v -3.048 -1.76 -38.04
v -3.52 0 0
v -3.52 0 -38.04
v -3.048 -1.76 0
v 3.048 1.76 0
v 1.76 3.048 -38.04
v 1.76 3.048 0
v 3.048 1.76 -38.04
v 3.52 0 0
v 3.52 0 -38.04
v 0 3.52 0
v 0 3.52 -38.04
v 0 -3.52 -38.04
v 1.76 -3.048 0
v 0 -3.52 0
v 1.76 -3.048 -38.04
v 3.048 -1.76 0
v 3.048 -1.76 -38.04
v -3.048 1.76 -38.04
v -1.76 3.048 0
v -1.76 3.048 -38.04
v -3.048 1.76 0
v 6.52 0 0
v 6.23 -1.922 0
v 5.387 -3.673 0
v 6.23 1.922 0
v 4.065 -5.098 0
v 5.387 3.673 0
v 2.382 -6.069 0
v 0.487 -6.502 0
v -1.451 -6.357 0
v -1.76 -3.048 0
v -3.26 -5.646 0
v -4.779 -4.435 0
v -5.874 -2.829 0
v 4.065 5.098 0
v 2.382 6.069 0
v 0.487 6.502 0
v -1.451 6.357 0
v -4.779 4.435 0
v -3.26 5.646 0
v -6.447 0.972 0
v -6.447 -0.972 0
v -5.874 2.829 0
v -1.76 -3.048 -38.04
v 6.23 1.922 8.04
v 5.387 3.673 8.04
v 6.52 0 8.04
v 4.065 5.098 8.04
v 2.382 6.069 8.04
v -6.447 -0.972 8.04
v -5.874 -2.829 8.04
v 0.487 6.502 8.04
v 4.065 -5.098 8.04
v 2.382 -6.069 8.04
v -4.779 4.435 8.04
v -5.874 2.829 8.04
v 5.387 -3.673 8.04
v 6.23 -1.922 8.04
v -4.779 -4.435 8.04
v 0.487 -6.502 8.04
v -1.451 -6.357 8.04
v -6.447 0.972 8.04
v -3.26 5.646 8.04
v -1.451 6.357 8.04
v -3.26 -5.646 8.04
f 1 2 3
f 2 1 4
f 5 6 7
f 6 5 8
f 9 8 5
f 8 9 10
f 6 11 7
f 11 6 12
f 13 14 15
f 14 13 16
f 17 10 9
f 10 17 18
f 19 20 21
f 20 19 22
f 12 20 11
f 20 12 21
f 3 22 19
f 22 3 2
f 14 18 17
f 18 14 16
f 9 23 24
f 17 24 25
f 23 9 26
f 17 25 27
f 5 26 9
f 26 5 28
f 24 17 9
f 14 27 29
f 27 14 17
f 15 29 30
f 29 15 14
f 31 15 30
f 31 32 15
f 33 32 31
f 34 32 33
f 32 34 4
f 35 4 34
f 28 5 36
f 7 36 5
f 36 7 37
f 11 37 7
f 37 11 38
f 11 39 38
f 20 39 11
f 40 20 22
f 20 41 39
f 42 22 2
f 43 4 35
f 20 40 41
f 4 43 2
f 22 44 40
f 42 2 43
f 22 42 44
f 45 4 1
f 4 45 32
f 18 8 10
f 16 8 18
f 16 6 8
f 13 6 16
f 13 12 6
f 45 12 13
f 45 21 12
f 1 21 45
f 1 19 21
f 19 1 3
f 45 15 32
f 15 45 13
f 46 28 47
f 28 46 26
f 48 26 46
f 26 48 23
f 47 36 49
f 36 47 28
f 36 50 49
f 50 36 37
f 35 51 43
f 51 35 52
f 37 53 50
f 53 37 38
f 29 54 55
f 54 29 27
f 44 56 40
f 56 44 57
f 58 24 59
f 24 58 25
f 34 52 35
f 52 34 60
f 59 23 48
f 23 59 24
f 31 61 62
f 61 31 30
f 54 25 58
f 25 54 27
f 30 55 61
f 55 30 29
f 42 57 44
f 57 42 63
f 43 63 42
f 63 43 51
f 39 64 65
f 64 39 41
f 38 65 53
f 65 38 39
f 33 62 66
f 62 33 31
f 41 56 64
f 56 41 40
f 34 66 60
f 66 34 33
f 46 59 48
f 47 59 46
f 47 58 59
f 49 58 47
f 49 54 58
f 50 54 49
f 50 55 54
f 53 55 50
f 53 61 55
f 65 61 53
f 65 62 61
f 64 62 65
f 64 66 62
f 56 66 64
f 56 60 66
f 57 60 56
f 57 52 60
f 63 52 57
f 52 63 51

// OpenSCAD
// file: Zrod.scad
function ZrodLength()=1000;
function ZrodDiameter()=8;  //base case: 8
function ZrodRadius()=ZrodDiameter()/2;

module Zrod()
{
color("Silver")
cylinder(ZrodLength(), ZrodRadius(), ZrodRadius());
}

Zrod();
// file: ../Parameters.scad
use<Vitamins/Zrod.scad>

function mm(i) = i*25.4; 

//Build dimensions (x,y,z)-- x, y and z of printable area, NOT of overall device

//z-rod length, diameter-- dependent on which rods you buy
//(bearing diameter is dependent on rod diameter)



function ZrodSpacing()=66;


//parametric of which hotend is being used (printerbot or bucha nozzle)

//stepper vs servo

//3 parameters (1 for each link) horizontal vs vertical

//paper is a parametric vitamin

//distance between link arms will be calculable based on radius of toolplate





//tolerances
function LaserCutTolerance() = .02;
function 3dPrinterTolerance() = .04;




//the equation used for plastic width, it can of course be changed
function PlasticWidth()= (ZrodDiameter()/2);
function SideWidth() = (ZrodDiameter()+PlasticWidth());
// main file
use <../Parameters.scad>

function BoltDiameter()= 7 + 3dPrinterTolerance();
function BoltLength()= 38 + 3dPrinterTolerance();
function BoltHeadDiameter()= 13 + 3dPrinterTolerance();
function BoltHeadHeight()= 8 + 3dPrinterTolerance();

//err on the side of larger tolerances for bolts

module LargeBolt()
{
	union()
	{
		translate([0,0,-BoltLength()])
		{
			cylinder(BoltLength(), BoltDiameter()/2,BoltDiameter()/2);
		}
		cylinder(BoltHeadHeight(), BoltHeadDiameter()/2,BoltHeadDiameter()/2);
	}
}

LargeBolt();
